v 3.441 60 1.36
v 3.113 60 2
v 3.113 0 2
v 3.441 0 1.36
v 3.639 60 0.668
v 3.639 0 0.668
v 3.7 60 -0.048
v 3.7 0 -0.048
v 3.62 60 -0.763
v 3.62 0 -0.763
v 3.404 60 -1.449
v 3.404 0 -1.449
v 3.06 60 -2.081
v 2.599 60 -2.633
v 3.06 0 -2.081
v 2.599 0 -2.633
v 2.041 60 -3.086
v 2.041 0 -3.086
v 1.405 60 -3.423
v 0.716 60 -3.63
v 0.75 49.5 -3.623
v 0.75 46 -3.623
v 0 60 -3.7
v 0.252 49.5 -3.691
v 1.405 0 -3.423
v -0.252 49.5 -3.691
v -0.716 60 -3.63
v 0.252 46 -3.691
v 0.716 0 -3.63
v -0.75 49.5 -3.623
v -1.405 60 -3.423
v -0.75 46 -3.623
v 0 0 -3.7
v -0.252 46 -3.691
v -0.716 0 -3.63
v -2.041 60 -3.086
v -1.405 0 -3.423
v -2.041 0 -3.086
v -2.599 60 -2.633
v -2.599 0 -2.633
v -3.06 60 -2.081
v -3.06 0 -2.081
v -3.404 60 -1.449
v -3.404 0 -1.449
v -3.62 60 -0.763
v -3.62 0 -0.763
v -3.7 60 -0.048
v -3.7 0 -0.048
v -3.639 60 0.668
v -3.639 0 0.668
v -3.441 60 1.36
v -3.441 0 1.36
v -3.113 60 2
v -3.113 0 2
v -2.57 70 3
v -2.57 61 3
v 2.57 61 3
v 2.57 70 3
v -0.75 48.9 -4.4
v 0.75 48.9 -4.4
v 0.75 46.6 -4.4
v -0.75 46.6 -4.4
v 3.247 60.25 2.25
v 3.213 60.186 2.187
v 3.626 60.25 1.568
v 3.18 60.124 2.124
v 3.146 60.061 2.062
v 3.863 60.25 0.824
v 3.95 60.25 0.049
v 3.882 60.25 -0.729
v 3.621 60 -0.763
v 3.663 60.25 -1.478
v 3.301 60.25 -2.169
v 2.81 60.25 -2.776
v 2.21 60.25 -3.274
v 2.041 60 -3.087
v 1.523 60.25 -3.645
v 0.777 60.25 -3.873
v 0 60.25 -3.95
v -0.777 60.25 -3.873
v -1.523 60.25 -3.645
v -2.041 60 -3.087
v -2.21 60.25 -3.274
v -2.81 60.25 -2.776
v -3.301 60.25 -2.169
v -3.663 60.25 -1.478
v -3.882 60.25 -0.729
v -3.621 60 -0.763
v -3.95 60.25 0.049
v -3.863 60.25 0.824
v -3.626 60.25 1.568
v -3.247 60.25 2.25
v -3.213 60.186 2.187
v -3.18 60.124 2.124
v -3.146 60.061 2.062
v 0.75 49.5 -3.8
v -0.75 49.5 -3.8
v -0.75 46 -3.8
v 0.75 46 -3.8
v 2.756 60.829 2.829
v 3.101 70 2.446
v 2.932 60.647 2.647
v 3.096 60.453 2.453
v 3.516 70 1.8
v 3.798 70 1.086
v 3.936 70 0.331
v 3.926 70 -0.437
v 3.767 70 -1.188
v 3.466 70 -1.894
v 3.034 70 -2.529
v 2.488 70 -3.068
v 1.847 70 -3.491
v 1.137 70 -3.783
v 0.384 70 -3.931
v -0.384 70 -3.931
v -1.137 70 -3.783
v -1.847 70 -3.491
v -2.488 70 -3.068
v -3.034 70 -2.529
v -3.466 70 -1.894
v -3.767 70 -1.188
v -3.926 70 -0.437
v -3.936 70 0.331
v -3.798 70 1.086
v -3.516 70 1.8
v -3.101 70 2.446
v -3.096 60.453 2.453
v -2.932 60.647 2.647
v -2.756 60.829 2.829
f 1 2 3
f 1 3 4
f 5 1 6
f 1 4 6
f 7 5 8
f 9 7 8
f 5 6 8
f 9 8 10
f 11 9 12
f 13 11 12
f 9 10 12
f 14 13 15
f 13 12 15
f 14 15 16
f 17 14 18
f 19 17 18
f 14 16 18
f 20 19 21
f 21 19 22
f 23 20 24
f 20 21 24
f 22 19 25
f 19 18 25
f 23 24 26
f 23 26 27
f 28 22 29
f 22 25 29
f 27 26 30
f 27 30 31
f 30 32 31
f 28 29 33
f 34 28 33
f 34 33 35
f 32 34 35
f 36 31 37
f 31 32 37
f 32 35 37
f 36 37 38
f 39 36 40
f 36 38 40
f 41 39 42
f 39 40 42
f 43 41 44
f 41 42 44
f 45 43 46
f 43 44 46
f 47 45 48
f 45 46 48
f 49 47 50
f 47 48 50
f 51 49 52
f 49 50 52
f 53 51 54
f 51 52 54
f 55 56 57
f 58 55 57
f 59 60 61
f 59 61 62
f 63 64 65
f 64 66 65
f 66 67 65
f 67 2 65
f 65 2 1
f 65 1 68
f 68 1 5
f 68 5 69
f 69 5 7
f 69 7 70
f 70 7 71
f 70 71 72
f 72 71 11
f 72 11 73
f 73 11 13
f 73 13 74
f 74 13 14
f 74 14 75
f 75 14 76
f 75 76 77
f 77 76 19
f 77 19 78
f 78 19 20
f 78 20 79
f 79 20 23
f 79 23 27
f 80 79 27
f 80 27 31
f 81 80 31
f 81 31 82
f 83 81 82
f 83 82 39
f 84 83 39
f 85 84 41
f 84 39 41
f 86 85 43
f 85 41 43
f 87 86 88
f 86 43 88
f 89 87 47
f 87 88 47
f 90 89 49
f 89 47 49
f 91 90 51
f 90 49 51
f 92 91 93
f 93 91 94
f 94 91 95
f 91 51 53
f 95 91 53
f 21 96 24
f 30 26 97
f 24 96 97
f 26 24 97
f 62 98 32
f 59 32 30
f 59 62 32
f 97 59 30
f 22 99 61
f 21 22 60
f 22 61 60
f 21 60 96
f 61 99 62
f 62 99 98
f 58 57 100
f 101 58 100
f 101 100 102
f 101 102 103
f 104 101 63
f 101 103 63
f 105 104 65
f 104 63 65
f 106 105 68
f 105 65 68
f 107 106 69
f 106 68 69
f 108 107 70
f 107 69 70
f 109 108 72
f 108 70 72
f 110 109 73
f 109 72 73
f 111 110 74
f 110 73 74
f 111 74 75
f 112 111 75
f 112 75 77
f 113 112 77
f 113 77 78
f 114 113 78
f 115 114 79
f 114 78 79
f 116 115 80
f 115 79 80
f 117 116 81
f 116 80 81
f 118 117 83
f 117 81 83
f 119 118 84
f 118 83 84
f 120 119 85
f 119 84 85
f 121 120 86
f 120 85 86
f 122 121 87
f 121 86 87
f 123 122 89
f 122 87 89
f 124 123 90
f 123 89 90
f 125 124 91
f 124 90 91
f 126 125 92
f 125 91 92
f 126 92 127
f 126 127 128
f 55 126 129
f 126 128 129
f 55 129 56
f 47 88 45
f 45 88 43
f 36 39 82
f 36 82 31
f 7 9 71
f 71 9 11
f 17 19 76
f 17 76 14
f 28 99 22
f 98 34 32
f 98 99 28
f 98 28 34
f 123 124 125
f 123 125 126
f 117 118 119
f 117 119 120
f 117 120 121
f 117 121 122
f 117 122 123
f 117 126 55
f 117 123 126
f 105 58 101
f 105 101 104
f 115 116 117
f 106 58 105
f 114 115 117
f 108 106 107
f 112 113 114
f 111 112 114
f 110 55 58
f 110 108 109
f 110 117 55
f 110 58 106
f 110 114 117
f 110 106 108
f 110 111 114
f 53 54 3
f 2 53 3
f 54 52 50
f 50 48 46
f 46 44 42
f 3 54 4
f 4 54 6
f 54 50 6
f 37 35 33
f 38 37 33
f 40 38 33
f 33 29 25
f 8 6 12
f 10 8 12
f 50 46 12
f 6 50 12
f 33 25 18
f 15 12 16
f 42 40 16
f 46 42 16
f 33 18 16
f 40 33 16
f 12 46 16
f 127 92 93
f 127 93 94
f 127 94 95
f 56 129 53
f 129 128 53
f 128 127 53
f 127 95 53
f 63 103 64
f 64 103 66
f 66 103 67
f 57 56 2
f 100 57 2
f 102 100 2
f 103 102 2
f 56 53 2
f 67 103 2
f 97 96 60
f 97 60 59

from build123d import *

# Parameters (mm, degrees)
BOSS_EXTRUDE1_DEPTH = 60
SKETCH2_W           = 1.5
SKETCH2_H           = 3.5
BOSS_EXTRUDE2_DEPTH = 0.7
SKETCH2_2_W         = 1.5
SKETCH2_2_H         = 3.5
BOSS_EXTRUDE3_DEPTH = 0.25
CHAMFER1_SIZE       = 0.6
CHAMFER2_SIZE       = 0.6
BOSS_EXTRUDE4_DEPTH = 10
CHAMFER3_SIZE       = 1
CHAMFER4_SIZE       = 0.25


with BuildPart() as part:
    # Sketch1 → Boss-Extrude1 (new body)
    with BuildSketch(Plane(origin=(0, 0, 0), x_dir=(1, 0, 0), z_dir=(0, 1, 0))):
        with BuildLine():
            Line((-3.112876483, -2), (3.112876483, -2))
            ThreePointArc((3.112876483, -2), (0, 3.7), (-3.112876483, -2))
        make_face()
    extrude(amount=BOSS_EXTRUDE1_DEPTH)



with BuildPart() as body_2:
    # Sketch2 → Boss-Extrude2 (new body)
    with BuildSketch(Plane(origin=(0, 0, -3.7), x_dir=(-1, 0, 0), z_dir=(0, 0, -1))):
        with Locations((0, 47.75)):
            Rectangle(SKETCH2_W, SKETCH2_H)
    extrude(amount=BOSS_EXTRUDE2_DEPTH)


with BuildPart() as part_1:
    add(part.part)

    add(body_2.part)  # Boss-Extrude3 merges body 2
    # Sketch2<2> → Boss-Extrude3 (add)
    with BuildSketch(Plane(origin=(0, 0, -3.7), x_dir=(-1, 0, 0), z_dir=(0, 0, -1))):
        with Locations((0, 47.75)):
            Rectangle(SKETCH2_2_W, SKETCH2_2_H)
    extrude(amount=-BOSS_EXTRUDE3_DEPTH)

    # Chamfer1
    chamfer1_edges = [part_1.edges().sort_by_distance(p)[0] for p in [
        (0, 49.5, -4.4),
    ]]
    chamfer(chamfer1_edges, length=CHAMFER1_SIZE)

    # Chamfer2
    chamfer2_edges = [part_1.edges().sort_by_distance(p)[0] for p in [
        (0, 46, -4.4),
    ]]
    chamfer(chamfer2_edges, length=CHAMFER2_SIZE)

    # Sketch3 → Boss-Extrude4 (add)
    with BuildSketch(Plane(origin=(0, 60, 0), x_dir=(1, 0, 0), z_dir=(0, 1, 0))):
        with BuildLine():
            Line((-2.569533032, -3), (2.569533032, -3))
            ThreePointArc((2.569533032, -3), (0, 3.95), (-2.569533032, -3))
        make_face()
    extrude(amount=BOSS_EXTRUDE4_DEPTH)

    # Chamfer3
    chamfer3_edges = [part_1.edges().sort_by_distance(p)[0] for p in [
        (0, 60, 3),
    ]]
    chamfer(chamfer3_edges, length=CHAMFER3_SIZE - 0.0001)  # a hair under: the kernel refuses the full size

    # Chamfer4
    chamfer4_edges = [part_1.edges().sort_by_distance(p)[0] for p in [
        (0, 60, -3.95),
    ]]
    chamfer(chamfer4_edges, length=CHAMFER4_SIZE - 0.0001)  # a hair under: the kernel refuses the full size


solid = part_1.part
